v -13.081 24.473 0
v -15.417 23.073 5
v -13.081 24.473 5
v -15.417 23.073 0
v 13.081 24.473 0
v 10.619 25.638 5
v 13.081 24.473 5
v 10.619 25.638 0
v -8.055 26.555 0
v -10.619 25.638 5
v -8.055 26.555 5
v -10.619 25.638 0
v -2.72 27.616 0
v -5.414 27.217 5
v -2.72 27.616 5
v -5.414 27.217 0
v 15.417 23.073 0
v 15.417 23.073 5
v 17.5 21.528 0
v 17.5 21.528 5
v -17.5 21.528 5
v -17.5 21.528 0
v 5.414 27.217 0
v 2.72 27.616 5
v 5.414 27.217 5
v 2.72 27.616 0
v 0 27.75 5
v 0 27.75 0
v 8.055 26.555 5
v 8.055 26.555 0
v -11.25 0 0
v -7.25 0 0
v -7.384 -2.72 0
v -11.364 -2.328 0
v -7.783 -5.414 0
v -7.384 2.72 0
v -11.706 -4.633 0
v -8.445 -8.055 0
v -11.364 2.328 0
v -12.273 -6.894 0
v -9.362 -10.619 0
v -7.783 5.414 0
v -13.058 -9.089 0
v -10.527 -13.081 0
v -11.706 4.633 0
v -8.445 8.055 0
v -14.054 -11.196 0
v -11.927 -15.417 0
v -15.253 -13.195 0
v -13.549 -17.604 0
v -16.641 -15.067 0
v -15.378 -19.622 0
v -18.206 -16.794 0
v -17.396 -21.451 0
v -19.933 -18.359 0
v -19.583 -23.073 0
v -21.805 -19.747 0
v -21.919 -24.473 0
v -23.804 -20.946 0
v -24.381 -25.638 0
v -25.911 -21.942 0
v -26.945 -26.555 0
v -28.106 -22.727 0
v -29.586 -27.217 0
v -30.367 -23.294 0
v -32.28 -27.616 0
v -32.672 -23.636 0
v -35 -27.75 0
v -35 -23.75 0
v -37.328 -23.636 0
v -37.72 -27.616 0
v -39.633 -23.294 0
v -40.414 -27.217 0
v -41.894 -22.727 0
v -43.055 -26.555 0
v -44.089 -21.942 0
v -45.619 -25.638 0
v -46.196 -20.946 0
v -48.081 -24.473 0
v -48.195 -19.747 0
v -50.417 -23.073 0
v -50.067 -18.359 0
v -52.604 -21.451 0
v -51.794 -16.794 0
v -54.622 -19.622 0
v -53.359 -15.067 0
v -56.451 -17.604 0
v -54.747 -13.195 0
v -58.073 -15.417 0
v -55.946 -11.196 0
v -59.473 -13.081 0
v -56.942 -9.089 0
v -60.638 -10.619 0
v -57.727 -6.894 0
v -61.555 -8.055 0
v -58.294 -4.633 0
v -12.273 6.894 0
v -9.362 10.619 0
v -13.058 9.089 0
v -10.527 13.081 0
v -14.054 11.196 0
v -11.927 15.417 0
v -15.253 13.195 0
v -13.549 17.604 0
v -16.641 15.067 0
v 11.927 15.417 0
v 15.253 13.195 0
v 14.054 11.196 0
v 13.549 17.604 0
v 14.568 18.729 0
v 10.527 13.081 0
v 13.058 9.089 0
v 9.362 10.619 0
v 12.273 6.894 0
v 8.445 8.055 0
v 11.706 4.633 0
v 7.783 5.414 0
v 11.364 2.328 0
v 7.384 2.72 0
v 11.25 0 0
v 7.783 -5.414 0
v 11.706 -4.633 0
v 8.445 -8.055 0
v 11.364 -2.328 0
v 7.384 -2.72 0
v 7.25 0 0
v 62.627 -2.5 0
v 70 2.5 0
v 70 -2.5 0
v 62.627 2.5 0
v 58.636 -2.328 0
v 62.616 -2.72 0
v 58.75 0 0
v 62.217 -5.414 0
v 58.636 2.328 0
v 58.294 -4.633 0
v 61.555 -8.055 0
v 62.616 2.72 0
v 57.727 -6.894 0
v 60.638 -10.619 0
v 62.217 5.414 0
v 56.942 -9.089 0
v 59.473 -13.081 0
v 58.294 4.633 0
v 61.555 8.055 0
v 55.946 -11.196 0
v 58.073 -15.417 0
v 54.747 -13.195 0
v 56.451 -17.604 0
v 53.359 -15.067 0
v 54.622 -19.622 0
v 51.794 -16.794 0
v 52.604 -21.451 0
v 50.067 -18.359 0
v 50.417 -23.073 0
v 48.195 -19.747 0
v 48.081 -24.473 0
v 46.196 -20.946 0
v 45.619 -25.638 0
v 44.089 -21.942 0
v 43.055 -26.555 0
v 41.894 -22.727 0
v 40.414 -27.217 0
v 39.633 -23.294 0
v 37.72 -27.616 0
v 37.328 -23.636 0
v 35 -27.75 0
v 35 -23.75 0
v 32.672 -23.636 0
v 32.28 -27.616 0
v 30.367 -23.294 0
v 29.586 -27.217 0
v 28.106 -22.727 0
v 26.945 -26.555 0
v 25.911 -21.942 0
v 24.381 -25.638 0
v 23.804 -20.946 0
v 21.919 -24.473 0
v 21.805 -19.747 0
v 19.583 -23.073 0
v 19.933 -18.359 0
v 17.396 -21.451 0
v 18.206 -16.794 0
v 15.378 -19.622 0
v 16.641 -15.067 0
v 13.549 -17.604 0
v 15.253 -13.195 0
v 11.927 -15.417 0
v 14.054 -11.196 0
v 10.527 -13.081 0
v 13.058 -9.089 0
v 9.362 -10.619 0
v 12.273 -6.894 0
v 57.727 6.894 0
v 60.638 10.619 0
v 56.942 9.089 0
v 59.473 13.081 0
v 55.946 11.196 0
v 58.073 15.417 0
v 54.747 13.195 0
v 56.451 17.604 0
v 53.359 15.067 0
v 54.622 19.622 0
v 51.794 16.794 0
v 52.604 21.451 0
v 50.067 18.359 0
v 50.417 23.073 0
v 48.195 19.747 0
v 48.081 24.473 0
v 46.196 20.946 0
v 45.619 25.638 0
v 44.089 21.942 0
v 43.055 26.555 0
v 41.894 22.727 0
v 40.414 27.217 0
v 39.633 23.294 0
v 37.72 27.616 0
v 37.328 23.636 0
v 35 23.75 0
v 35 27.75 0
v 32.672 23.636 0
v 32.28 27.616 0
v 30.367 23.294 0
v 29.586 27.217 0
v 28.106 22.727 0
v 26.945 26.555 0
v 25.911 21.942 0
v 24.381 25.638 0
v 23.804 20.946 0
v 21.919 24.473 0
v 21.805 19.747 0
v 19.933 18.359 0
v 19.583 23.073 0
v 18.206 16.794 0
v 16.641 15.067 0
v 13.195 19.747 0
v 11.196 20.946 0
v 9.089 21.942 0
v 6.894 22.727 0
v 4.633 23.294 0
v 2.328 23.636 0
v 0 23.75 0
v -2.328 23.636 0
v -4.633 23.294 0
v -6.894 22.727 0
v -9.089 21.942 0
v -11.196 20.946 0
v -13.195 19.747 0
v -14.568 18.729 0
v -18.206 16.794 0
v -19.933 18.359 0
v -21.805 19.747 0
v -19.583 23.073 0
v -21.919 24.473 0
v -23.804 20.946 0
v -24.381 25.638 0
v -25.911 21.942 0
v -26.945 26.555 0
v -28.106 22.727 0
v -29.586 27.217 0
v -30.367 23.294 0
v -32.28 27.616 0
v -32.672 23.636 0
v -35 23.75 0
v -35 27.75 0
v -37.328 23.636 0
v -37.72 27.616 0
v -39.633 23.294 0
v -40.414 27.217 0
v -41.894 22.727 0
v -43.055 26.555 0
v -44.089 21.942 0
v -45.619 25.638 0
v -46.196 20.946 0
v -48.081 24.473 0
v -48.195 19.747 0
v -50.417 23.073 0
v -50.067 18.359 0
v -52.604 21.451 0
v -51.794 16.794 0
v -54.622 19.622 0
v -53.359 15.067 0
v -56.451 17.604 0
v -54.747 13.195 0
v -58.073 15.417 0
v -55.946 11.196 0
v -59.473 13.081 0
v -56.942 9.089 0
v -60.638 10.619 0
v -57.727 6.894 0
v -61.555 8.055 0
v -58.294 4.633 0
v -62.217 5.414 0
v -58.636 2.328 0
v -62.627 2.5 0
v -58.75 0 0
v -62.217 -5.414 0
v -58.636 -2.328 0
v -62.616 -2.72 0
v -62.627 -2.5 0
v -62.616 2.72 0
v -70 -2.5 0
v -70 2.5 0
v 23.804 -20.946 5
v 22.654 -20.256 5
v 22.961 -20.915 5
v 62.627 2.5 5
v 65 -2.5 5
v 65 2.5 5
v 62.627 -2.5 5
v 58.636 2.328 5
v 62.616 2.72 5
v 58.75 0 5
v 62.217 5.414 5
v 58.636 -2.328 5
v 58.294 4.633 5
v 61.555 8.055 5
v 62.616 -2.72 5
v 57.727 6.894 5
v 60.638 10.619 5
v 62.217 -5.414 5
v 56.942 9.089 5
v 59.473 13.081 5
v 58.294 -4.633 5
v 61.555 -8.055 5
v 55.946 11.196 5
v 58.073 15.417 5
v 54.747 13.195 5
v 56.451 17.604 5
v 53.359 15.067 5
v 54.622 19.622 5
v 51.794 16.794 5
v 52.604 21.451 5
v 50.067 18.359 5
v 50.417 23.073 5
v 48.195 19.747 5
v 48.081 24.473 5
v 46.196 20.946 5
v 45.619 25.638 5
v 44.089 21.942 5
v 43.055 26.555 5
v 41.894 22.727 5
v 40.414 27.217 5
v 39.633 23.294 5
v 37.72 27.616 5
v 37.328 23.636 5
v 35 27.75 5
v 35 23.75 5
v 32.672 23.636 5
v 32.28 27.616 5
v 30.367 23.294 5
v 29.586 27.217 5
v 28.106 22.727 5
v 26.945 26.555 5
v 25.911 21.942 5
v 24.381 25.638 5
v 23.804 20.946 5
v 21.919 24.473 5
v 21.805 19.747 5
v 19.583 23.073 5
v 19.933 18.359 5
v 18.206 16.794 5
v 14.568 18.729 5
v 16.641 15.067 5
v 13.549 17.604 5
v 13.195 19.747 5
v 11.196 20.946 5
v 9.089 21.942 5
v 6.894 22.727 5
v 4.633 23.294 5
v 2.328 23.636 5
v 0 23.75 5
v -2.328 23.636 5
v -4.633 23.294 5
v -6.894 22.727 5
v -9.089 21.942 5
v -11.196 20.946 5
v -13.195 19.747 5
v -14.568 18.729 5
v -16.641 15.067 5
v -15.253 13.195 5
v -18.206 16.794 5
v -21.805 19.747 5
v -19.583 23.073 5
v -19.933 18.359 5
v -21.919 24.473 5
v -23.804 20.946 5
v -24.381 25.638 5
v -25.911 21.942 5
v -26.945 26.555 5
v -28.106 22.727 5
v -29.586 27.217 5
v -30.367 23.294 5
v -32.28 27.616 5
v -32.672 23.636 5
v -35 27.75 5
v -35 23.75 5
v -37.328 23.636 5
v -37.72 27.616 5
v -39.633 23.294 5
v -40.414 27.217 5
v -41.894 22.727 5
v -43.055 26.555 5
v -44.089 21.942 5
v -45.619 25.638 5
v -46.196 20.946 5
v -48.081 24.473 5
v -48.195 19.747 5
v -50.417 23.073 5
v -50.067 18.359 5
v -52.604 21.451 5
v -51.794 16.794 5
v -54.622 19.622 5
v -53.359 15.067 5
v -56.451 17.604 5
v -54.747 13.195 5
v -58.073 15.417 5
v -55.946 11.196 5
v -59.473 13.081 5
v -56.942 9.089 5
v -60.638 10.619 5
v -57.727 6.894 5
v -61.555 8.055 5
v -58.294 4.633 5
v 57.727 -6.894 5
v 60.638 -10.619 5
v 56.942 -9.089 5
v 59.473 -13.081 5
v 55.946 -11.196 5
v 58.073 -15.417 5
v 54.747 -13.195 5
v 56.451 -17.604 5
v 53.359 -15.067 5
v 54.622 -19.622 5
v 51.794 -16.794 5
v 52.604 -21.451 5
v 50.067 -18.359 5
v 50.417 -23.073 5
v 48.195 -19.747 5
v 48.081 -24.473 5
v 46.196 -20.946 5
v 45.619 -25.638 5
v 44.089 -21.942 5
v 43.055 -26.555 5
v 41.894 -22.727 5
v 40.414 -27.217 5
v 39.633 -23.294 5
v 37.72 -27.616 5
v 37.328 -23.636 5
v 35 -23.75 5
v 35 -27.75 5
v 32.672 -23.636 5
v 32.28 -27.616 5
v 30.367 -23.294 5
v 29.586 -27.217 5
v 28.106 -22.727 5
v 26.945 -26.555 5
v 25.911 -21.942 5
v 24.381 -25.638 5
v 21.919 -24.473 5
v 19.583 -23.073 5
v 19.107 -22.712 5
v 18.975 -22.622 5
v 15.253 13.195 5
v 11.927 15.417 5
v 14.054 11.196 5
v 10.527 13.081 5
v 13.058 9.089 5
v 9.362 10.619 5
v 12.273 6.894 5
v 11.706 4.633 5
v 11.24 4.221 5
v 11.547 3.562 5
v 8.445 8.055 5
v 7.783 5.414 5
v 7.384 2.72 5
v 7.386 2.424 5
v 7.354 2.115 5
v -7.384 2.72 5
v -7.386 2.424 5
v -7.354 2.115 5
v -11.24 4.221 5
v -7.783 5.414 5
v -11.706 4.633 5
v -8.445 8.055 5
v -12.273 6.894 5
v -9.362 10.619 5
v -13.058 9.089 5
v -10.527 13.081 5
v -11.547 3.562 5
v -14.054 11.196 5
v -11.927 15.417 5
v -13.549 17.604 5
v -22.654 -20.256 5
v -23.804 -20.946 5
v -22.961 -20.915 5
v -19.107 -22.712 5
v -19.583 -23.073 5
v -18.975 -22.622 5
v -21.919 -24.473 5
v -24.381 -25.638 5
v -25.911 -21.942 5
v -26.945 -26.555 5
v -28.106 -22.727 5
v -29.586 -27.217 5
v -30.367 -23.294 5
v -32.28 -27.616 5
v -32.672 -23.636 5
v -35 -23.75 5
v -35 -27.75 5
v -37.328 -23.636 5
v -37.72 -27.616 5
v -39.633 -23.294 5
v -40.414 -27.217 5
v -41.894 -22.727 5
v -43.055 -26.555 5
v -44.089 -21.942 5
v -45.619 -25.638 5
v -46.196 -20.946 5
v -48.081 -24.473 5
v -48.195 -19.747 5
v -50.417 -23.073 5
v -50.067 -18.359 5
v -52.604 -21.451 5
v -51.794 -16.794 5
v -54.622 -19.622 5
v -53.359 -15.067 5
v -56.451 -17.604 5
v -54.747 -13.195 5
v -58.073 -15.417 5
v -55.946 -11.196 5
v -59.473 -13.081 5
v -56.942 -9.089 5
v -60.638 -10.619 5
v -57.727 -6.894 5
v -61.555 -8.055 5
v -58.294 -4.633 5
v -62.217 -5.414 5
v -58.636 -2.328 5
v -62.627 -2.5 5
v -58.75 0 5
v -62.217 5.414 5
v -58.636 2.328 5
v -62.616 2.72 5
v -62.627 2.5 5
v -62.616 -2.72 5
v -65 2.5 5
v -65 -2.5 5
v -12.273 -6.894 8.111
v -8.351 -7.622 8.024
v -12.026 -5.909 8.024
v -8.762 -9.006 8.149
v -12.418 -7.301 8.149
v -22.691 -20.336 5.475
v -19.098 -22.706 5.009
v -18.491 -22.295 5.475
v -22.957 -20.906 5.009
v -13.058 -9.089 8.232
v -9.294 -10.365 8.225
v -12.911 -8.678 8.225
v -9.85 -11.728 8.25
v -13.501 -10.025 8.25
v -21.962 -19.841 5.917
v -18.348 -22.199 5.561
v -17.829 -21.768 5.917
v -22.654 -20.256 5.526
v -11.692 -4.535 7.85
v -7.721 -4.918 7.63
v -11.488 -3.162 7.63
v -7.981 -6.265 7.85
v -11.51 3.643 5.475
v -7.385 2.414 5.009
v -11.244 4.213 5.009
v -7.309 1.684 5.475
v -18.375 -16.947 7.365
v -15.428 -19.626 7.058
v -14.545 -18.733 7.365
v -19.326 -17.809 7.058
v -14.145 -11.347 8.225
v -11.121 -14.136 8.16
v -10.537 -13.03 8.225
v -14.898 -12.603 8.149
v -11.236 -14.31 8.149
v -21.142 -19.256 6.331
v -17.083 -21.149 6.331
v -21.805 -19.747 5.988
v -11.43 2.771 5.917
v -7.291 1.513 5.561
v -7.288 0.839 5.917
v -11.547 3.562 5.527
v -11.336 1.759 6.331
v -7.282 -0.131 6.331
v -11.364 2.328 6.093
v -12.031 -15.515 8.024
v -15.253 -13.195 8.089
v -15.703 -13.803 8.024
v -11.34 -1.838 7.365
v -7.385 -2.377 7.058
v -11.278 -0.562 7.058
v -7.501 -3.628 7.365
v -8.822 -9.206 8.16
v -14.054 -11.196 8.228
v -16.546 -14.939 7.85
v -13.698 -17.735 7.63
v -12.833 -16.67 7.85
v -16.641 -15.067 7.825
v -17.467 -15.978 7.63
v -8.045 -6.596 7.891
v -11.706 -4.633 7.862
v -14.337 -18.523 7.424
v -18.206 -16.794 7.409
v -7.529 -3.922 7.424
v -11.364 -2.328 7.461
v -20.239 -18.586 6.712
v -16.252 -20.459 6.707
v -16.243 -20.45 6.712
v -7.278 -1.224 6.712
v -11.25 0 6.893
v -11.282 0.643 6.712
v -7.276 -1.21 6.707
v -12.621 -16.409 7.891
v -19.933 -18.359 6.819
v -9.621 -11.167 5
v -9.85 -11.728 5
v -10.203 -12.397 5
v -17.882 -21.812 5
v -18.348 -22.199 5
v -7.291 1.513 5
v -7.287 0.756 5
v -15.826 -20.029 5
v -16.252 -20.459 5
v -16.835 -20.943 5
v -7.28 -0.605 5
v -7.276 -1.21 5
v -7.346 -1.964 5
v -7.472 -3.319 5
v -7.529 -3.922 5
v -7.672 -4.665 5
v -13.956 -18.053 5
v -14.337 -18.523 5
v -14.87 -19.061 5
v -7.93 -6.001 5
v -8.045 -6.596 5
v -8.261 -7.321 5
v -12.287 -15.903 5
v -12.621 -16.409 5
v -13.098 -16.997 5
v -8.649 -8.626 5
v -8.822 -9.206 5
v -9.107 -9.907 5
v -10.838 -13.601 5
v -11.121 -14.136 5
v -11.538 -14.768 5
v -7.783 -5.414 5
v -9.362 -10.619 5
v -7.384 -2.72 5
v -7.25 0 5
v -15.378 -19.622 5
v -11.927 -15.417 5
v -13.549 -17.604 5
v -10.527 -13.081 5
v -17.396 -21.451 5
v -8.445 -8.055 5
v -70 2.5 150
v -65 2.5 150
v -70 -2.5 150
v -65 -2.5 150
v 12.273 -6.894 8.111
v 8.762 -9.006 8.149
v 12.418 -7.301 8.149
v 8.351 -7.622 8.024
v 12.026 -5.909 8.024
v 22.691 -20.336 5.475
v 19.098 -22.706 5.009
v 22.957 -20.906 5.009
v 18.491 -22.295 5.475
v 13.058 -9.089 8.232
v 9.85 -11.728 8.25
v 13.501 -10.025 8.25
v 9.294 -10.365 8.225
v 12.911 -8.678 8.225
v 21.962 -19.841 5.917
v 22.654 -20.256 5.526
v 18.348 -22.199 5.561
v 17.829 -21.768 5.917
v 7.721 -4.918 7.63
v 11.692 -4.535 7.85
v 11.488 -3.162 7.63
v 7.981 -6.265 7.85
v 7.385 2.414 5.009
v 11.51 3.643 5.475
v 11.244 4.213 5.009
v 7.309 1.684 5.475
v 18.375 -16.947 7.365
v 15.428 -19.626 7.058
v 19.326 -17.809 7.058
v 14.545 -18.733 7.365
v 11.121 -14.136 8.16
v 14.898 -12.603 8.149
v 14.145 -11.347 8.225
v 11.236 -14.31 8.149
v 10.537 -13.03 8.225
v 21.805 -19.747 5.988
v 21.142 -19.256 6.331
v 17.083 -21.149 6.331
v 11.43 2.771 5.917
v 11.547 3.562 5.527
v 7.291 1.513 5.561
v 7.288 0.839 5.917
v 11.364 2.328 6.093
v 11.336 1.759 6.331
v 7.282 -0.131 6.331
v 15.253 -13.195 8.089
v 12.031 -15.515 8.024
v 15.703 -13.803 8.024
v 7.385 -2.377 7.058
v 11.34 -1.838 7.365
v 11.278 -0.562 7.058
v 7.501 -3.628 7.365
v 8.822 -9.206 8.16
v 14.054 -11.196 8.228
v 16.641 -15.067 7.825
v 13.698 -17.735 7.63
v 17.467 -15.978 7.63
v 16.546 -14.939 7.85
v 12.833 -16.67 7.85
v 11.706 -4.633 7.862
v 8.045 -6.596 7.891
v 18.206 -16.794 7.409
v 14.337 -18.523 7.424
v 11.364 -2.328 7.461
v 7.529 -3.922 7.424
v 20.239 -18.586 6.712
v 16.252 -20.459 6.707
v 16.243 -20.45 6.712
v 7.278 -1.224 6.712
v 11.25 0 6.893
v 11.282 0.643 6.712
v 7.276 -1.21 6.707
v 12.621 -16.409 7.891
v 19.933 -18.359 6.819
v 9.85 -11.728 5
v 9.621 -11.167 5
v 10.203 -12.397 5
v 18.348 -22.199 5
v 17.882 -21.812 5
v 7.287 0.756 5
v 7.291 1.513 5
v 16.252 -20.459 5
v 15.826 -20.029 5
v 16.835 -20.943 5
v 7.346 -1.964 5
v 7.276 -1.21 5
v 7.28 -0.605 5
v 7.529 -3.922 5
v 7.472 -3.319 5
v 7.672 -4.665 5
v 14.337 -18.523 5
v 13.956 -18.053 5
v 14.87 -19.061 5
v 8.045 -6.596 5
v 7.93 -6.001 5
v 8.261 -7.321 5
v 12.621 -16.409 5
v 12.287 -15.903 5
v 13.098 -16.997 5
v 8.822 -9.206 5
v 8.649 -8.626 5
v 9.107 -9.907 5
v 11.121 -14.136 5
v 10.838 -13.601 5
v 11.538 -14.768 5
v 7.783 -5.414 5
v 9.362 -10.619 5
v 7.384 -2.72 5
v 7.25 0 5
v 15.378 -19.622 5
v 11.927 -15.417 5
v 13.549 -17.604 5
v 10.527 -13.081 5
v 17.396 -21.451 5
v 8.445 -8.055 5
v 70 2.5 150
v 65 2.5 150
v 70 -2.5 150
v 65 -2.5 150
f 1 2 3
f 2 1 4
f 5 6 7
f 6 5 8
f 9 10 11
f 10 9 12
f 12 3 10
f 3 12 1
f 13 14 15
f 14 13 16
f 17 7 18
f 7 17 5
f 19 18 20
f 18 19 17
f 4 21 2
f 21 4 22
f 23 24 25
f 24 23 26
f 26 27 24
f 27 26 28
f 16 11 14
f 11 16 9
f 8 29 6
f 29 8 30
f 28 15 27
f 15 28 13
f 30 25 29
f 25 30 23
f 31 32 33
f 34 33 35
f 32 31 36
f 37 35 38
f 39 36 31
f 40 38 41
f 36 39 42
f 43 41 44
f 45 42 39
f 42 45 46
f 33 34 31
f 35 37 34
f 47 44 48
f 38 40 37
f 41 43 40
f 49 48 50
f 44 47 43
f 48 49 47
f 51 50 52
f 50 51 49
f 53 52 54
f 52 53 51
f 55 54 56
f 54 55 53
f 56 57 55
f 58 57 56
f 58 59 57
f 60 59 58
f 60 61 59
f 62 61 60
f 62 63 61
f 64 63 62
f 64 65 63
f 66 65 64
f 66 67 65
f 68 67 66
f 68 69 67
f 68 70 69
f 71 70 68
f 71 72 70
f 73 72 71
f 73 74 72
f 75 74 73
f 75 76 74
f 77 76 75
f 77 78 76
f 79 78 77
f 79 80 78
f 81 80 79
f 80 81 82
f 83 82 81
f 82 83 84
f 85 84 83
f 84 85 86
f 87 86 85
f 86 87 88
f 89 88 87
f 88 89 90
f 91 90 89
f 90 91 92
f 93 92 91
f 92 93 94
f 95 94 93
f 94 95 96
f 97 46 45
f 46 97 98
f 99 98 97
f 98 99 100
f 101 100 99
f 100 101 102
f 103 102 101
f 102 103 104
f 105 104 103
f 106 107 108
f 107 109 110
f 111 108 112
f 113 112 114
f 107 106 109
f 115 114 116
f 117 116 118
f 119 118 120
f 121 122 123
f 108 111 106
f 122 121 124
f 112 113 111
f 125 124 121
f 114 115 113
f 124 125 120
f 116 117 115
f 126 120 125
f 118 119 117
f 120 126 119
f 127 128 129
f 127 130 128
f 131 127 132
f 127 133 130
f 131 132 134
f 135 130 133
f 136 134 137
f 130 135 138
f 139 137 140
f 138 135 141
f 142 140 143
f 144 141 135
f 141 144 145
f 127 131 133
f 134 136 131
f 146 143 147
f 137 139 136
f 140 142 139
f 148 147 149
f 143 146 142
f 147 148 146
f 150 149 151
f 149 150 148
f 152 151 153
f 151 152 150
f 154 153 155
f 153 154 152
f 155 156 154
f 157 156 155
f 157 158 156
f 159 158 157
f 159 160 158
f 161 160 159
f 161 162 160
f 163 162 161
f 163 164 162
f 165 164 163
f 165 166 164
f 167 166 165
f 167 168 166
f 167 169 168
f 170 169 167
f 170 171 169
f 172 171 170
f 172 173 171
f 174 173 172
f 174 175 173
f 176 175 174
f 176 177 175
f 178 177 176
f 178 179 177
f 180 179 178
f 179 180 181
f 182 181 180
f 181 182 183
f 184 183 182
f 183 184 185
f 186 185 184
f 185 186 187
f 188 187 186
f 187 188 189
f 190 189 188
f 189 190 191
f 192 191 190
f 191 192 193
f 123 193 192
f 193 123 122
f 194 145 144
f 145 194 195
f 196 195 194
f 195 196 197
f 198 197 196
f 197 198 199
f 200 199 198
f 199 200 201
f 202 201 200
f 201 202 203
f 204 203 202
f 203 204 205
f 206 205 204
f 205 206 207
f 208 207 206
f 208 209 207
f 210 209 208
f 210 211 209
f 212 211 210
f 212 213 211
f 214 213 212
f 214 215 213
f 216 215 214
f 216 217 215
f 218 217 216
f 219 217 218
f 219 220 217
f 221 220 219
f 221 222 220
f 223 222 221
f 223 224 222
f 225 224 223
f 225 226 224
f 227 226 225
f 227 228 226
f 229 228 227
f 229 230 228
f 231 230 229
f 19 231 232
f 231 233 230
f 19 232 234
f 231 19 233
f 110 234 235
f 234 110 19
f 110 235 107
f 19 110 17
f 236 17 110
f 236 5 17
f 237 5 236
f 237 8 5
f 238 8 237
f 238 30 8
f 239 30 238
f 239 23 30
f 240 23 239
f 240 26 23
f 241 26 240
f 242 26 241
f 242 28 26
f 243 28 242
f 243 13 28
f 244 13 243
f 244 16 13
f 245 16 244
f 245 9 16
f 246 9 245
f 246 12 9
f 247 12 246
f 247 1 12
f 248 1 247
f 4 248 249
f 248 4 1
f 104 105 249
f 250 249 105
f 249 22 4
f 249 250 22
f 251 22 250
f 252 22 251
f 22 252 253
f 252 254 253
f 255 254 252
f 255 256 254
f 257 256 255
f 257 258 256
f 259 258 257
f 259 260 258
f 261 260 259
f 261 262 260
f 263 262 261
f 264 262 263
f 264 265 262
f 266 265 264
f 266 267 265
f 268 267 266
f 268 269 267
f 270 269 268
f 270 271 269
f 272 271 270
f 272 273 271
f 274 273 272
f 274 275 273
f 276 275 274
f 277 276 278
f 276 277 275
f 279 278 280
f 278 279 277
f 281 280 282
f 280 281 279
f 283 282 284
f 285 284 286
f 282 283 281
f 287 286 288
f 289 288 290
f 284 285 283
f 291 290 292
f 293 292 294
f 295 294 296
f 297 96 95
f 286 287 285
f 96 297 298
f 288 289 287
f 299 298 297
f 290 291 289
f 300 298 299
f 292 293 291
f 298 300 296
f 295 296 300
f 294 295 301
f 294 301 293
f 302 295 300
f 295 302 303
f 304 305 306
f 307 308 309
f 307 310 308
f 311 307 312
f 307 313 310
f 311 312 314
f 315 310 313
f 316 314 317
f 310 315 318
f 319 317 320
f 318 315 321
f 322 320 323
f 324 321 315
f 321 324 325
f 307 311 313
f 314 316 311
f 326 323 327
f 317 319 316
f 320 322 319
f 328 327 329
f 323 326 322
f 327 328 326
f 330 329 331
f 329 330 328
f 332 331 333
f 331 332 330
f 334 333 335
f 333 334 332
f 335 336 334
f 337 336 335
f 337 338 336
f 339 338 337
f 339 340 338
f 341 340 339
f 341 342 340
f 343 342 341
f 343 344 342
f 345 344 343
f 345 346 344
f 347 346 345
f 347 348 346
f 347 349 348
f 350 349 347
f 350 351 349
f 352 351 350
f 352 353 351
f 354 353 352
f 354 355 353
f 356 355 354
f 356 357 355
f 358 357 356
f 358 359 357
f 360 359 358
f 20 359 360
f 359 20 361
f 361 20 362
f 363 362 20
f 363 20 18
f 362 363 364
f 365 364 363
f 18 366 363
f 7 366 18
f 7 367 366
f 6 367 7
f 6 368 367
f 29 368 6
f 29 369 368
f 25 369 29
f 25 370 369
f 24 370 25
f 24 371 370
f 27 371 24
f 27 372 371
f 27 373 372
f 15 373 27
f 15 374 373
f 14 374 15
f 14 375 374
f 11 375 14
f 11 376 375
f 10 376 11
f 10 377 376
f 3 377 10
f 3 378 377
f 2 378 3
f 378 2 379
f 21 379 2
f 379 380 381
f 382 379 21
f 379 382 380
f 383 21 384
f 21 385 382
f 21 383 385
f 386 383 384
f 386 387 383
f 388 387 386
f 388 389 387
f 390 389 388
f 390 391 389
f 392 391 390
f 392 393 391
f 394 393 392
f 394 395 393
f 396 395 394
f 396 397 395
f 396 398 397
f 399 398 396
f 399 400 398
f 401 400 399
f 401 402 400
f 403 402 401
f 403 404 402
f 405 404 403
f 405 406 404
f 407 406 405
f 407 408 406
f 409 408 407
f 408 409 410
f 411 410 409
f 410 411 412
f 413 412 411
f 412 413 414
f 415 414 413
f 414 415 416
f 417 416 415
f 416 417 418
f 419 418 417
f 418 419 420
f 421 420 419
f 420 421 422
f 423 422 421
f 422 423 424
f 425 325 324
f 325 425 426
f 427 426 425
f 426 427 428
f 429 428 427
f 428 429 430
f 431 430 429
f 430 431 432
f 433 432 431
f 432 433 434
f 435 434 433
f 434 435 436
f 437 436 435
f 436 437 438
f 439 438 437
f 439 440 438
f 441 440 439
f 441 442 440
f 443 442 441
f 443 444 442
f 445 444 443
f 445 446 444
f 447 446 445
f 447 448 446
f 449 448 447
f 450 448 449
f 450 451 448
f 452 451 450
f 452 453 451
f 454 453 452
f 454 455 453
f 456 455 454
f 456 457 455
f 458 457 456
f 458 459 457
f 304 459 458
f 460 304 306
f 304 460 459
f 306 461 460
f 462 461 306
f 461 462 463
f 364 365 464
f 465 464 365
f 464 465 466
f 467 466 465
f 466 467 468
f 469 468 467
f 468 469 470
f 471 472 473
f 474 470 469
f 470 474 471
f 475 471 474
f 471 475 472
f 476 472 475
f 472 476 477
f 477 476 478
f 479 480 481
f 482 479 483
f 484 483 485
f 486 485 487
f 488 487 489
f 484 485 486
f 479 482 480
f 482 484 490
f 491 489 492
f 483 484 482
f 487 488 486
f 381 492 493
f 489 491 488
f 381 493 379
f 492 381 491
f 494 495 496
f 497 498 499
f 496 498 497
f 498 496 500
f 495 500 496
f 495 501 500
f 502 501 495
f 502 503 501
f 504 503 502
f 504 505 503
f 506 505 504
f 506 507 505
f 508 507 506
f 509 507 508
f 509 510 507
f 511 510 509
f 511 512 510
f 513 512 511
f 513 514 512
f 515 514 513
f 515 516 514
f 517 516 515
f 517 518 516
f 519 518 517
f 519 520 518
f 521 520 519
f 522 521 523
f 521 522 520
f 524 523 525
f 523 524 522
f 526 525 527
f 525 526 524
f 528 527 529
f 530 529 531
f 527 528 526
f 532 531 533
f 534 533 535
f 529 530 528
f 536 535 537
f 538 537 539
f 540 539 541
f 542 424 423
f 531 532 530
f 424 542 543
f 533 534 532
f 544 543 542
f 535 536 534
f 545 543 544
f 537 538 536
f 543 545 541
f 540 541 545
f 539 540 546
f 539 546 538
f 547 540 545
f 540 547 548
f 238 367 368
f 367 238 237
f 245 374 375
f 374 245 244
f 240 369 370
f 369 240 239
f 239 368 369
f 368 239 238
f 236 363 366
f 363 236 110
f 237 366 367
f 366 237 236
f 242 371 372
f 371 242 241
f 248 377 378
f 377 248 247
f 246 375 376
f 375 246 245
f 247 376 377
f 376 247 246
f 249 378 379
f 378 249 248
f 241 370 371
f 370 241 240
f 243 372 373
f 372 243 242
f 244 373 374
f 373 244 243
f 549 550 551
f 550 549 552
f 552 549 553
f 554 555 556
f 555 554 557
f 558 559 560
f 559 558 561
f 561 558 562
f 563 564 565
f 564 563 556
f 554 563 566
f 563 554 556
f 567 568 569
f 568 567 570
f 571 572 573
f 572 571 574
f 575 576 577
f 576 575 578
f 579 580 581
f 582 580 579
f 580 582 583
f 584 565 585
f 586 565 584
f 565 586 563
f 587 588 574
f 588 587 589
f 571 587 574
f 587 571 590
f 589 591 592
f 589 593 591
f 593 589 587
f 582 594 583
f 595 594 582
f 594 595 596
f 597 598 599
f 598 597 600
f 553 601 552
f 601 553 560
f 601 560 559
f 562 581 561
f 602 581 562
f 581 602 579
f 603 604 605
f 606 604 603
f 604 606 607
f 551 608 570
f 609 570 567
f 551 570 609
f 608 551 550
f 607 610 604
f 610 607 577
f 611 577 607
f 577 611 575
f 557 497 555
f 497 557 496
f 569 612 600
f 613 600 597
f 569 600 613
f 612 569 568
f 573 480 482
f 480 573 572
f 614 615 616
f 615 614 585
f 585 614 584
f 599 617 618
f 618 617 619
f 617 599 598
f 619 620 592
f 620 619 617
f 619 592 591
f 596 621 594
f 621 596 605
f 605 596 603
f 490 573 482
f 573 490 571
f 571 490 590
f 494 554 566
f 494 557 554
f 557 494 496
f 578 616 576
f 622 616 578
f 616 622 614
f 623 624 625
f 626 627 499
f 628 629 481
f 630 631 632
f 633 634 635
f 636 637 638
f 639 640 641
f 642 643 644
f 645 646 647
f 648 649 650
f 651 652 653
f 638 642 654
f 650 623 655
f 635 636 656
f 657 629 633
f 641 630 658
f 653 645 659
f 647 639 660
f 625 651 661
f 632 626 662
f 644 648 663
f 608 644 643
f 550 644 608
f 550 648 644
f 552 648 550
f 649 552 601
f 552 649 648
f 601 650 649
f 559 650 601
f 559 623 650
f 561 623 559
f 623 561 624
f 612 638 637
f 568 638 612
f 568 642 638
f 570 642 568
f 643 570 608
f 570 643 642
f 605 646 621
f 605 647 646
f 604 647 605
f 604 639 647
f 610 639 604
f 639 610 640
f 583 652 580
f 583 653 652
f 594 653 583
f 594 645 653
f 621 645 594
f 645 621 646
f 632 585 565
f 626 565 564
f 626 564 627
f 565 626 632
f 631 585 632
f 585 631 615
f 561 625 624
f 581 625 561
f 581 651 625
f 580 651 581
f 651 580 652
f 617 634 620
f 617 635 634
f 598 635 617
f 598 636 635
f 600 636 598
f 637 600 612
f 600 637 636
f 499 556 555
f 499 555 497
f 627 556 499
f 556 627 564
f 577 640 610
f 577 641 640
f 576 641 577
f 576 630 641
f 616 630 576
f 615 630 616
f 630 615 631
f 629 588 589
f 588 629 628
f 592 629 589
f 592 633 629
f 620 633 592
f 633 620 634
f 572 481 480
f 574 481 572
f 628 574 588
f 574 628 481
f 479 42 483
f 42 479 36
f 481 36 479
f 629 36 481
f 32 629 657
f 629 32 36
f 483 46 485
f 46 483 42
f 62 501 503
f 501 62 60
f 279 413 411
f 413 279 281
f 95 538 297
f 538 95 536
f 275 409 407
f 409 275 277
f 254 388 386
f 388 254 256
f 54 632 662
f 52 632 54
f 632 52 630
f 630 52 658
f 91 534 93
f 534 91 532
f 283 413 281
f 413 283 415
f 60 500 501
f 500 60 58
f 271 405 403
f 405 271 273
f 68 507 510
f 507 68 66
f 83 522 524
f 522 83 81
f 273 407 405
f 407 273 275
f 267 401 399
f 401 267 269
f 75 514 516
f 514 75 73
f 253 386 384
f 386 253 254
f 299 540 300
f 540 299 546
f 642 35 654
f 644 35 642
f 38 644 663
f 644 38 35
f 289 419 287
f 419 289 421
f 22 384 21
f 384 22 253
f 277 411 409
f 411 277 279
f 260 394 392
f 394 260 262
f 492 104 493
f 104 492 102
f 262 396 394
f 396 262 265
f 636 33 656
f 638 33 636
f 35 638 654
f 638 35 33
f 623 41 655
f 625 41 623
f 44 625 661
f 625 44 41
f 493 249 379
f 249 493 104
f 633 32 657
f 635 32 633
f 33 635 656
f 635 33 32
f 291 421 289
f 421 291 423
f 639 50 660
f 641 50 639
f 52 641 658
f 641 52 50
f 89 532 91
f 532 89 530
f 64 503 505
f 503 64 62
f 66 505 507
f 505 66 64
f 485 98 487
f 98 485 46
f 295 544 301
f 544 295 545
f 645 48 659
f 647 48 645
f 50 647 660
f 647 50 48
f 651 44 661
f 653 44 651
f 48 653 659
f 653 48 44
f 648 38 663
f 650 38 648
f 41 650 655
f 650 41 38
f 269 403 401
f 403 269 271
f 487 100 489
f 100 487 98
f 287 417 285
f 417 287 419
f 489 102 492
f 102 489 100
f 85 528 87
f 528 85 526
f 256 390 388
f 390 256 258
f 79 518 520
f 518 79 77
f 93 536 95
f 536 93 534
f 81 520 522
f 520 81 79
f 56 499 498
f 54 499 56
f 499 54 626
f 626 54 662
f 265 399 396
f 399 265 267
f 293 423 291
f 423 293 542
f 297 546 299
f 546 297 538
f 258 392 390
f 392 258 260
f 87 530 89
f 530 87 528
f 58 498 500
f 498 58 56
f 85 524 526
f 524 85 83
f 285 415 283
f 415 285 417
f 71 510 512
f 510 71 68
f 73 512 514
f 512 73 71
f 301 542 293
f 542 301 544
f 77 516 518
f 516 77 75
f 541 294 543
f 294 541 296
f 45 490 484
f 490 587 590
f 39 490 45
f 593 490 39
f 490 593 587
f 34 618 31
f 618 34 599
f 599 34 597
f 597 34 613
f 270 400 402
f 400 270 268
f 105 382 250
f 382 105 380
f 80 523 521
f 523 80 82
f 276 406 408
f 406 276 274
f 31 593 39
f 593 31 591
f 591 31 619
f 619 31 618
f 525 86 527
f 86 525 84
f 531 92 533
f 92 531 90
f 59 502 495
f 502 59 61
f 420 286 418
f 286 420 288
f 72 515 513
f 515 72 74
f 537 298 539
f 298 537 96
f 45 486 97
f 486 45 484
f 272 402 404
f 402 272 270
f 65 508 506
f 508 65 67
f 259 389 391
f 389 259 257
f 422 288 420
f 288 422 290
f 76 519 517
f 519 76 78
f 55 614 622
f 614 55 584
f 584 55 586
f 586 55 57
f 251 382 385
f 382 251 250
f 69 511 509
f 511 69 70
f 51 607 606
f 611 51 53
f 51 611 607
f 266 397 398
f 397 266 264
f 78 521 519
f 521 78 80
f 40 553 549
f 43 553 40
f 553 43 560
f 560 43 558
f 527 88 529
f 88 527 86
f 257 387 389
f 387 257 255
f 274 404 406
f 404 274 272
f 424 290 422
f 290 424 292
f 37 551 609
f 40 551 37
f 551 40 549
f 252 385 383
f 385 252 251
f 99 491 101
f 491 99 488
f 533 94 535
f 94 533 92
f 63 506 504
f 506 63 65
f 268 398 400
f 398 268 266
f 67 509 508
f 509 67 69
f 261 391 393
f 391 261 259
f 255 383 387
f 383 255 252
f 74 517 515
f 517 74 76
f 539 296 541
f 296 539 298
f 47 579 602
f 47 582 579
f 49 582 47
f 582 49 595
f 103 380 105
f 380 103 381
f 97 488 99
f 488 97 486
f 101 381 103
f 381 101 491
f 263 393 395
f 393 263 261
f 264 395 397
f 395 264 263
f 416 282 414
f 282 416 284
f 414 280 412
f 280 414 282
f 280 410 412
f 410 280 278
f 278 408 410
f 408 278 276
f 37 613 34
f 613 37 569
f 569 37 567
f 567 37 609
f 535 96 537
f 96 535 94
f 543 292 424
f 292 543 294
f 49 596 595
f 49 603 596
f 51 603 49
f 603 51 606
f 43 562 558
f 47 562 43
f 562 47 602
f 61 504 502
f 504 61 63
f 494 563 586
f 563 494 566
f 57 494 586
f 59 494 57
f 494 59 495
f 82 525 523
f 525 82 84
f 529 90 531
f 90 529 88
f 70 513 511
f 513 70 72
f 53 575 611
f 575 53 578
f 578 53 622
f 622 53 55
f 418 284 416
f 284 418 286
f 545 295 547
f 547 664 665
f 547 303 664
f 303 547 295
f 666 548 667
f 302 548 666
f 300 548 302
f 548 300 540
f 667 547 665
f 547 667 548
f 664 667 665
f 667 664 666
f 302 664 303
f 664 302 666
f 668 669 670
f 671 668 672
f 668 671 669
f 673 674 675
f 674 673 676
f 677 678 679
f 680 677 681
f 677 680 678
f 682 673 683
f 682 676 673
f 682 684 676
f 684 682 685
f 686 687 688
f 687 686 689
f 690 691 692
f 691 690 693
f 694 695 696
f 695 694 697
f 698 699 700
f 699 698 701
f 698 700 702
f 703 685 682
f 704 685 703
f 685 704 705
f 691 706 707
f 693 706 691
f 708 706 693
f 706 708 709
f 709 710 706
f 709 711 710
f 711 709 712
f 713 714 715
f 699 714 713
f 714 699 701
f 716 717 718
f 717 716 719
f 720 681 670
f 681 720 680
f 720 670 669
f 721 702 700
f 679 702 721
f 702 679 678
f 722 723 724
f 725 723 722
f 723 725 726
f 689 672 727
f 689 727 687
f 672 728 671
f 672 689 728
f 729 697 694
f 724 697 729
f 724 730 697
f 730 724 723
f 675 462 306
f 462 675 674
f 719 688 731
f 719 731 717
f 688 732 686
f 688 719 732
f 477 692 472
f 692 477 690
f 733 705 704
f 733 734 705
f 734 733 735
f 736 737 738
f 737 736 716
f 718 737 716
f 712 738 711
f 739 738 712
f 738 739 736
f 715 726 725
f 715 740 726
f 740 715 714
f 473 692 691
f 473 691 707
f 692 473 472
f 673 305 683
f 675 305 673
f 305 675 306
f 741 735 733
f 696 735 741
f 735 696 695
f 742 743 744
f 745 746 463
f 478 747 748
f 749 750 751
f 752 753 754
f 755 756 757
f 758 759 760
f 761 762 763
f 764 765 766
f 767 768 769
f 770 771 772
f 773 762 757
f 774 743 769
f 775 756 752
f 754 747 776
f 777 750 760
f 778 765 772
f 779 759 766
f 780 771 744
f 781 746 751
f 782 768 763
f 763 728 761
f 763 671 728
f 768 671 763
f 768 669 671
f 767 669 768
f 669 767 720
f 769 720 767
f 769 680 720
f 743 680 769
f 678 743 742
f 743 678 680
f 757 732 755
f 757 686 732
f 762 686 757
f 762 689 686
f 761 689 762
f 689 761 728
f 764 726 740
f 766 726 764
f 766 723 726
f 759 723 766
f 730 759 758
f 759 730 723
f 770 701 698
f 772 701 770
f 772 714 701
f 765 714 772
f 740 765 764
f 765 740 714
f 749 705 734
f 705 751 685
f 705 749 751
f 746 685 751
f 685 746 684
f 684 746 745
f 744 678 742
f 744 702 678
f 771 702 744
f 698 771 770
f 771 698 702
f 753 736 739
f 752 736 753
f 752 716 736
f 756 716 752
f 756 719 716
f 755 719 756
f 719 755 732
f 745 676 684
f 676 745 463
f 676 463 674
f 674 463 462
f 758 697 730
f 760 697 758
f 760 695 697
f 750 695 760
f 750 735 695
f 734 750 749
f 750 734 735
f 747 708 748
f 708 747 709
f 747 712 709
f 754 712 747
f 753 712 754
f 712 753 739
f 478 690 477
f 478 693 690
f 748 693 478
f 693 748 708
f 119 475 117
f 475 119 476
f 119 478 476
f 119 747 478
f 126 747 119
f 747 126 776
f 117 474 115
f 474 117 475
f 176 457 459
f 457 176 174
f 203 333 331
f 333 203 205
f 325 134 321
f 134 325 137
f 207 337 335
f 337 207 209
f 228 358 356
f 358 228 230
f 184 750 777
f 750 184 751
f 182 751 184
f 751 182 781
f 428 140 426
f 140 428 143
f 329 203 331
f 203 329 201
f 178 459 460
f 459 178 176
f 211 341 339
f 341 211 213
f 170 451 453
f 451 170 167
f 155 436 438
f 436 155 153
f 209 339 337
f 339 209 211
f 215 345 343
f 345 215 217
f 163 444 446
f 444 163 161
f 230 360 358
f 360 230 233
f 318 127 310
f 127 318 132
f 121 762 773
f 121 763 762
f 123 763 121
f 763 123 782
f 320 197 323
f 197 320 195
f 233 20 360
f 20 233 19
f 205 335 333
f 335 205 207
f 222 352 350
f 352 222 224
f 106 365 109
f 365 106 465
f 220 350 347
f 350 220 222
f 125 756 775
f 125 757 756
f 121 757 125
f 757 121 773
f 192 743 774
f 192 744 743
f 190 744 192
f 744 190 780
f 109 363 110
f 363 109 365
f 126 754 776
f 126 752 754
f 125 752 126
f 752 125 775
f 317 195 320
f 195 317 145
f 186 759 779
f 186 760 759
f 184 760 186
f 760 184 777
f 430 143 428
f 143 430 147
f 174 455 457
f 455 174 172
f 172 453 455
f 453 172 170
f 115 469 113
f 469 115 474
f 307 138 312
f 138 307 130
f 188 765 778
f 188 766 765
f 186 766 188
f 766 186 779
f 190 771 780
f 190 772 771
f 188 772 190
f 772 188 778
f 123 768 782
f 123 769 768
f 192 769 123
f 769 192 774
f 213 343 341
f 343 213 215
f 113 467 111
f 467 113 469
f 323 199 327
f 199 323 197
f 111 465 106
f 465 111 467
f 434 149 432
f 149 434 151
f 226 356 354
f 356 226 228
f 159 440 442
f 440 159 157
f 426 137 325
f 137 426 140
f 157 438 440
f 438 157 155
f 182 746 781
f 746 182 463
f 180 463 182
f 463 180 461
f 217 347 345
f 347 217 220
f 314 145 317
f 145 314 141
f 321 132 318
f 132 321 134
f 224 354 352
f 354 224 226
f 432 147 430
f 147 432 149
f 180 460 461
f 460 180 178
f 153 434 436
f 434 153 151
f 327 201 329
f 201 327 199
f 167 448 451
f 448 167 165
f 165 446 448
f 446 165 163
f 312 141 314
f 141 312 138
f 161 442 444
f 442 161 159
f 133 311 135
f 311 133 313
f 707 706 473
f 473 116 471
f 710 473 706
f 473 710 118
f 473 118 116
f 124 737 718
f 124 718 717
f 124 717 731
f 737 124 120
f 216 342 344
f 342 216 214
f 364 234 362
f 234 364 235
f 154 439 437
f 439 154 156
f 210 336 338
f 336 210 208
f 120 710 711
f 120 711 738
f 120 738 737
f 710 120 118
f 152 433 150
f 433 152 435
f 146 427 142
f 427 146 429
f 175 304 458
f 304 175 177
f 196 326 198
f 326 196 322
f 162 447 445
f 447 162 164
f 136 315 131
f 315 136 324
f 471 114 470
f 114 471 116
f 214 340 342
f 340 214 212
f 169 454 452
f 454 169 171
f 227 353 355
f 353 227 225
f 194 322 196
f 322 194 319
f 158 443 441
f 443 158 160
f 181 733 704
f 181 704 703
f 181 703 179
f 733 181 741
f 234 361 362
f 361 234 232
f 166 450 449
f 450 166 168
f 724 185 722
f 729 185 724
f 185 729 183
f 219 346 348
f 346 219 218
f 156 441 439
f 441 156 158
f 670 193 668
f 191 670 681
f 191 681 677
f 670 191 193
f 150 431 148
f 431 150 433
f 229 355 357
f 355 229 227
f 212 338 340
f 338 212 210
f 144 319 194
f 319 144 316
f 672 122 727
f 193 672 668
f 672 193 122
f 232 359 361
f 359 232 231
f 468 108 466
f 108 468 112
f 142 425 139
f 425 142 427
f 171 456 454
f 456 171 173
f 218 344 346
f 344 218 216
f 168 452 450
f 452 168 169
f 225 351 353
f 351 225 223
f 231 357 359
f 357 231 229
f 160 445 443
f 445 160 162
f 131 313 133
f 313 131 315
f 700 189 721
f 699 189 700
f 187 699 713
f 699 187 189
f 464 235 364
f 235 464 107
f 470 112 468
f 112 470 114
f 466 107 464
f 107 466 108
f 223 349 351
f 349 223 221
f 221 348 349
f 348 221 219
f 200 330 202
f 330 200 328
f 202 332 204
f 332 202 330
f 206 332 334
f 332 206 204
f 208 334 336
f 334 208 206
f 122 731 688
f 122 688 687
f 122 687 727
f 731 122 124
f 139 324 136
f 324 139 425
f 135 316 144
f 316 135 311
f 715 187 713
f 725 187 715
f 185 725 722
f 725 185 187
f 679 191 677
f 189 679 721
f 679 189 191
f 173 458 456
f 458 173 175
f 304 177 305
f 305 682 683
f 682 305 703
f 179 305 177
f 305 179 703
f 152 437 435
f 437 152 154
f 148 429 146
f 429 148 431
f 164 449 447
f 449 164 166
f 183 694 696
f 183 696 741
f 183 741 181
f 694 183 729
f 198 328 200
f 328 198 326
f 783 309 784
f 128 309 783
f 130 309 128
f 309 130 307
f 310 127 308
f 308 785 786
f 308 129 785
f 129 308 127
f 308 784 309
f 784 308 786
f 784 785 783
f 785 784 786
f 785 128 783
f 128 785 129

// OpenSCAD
//Lens diameter
gdiam=47.5;
//Temple size (width of glasses).
tsize=135;
//Pupil distance
pd=70;
//Glasses thickness
th=4;
//Temple length
lscales=150;
//Thickness of the lenses
gheight=5;

$fn=64;

module EyeCylinder()
{
        difference()
        {
            union()
            {
                cylinder(d=gdiam+th*2, h=gheight);
                NosePad();
            }
            LensHole();
        }  
}

module  LensHole()
{
    translate([0,0,-.1])
    cylinder(d=gdiam, h=gheight*2.2, center=true);
}

module NosePad()
{
    rotate([0,0,-25])
    intersection()
    {
        translate([gdiam/2,0,th/2])
     
        scale([1,1,.35])
        rotate([0,90,0])
        cylinder(r=15, h=th*2, center=true);

        scale(100) // The lower half only
        translate([-.5,-.5,-1])
        cube(1);
        
        cylinder(d=gdiam+th*2, h=gheight*15, center=true); // Inside the lens cylinder
    }
}

module Eye()
{
    EyeCylinder();
    translate([0,0,gheight])
    mirror([0,0,1])
    {
        offs=(tsize-pd)/2;
        
        translate([-offs,0,0])
        scale([offs-(gdiam+2*th)/2, gheight, gheight])
        translate([.65,0,.5])
        cube(1, center=true);
        
        
        translate([-offs,0,])
        scale([gheight,gheight,lscales])
        translate([0,0,.5])
        cube(1,center=true);
    }
}

module TwoEyes()
{
    translate([-pd/2,0,gheight]) // Center
    mirror([0,0,1])
    union()
    {
        Eye();
        translate([pd,0,0])
        mirror([1,0,0]) // Not necessary for a round lens
        Eye();
    }
}

module RoundGlasses()
{
    difference()
    {
        cylinder(d=gdiam+th*2, h=gheight);
        LensHole();
        translate([-pd/2,0,0])
        LensHole();
        translate([pd/2,0,0])
        LensHole();
        translate([-pd/2,-pd,-pd/2])
        cube(pd);
    }
    TwoEyes();
}

RoundGlasses();


        
